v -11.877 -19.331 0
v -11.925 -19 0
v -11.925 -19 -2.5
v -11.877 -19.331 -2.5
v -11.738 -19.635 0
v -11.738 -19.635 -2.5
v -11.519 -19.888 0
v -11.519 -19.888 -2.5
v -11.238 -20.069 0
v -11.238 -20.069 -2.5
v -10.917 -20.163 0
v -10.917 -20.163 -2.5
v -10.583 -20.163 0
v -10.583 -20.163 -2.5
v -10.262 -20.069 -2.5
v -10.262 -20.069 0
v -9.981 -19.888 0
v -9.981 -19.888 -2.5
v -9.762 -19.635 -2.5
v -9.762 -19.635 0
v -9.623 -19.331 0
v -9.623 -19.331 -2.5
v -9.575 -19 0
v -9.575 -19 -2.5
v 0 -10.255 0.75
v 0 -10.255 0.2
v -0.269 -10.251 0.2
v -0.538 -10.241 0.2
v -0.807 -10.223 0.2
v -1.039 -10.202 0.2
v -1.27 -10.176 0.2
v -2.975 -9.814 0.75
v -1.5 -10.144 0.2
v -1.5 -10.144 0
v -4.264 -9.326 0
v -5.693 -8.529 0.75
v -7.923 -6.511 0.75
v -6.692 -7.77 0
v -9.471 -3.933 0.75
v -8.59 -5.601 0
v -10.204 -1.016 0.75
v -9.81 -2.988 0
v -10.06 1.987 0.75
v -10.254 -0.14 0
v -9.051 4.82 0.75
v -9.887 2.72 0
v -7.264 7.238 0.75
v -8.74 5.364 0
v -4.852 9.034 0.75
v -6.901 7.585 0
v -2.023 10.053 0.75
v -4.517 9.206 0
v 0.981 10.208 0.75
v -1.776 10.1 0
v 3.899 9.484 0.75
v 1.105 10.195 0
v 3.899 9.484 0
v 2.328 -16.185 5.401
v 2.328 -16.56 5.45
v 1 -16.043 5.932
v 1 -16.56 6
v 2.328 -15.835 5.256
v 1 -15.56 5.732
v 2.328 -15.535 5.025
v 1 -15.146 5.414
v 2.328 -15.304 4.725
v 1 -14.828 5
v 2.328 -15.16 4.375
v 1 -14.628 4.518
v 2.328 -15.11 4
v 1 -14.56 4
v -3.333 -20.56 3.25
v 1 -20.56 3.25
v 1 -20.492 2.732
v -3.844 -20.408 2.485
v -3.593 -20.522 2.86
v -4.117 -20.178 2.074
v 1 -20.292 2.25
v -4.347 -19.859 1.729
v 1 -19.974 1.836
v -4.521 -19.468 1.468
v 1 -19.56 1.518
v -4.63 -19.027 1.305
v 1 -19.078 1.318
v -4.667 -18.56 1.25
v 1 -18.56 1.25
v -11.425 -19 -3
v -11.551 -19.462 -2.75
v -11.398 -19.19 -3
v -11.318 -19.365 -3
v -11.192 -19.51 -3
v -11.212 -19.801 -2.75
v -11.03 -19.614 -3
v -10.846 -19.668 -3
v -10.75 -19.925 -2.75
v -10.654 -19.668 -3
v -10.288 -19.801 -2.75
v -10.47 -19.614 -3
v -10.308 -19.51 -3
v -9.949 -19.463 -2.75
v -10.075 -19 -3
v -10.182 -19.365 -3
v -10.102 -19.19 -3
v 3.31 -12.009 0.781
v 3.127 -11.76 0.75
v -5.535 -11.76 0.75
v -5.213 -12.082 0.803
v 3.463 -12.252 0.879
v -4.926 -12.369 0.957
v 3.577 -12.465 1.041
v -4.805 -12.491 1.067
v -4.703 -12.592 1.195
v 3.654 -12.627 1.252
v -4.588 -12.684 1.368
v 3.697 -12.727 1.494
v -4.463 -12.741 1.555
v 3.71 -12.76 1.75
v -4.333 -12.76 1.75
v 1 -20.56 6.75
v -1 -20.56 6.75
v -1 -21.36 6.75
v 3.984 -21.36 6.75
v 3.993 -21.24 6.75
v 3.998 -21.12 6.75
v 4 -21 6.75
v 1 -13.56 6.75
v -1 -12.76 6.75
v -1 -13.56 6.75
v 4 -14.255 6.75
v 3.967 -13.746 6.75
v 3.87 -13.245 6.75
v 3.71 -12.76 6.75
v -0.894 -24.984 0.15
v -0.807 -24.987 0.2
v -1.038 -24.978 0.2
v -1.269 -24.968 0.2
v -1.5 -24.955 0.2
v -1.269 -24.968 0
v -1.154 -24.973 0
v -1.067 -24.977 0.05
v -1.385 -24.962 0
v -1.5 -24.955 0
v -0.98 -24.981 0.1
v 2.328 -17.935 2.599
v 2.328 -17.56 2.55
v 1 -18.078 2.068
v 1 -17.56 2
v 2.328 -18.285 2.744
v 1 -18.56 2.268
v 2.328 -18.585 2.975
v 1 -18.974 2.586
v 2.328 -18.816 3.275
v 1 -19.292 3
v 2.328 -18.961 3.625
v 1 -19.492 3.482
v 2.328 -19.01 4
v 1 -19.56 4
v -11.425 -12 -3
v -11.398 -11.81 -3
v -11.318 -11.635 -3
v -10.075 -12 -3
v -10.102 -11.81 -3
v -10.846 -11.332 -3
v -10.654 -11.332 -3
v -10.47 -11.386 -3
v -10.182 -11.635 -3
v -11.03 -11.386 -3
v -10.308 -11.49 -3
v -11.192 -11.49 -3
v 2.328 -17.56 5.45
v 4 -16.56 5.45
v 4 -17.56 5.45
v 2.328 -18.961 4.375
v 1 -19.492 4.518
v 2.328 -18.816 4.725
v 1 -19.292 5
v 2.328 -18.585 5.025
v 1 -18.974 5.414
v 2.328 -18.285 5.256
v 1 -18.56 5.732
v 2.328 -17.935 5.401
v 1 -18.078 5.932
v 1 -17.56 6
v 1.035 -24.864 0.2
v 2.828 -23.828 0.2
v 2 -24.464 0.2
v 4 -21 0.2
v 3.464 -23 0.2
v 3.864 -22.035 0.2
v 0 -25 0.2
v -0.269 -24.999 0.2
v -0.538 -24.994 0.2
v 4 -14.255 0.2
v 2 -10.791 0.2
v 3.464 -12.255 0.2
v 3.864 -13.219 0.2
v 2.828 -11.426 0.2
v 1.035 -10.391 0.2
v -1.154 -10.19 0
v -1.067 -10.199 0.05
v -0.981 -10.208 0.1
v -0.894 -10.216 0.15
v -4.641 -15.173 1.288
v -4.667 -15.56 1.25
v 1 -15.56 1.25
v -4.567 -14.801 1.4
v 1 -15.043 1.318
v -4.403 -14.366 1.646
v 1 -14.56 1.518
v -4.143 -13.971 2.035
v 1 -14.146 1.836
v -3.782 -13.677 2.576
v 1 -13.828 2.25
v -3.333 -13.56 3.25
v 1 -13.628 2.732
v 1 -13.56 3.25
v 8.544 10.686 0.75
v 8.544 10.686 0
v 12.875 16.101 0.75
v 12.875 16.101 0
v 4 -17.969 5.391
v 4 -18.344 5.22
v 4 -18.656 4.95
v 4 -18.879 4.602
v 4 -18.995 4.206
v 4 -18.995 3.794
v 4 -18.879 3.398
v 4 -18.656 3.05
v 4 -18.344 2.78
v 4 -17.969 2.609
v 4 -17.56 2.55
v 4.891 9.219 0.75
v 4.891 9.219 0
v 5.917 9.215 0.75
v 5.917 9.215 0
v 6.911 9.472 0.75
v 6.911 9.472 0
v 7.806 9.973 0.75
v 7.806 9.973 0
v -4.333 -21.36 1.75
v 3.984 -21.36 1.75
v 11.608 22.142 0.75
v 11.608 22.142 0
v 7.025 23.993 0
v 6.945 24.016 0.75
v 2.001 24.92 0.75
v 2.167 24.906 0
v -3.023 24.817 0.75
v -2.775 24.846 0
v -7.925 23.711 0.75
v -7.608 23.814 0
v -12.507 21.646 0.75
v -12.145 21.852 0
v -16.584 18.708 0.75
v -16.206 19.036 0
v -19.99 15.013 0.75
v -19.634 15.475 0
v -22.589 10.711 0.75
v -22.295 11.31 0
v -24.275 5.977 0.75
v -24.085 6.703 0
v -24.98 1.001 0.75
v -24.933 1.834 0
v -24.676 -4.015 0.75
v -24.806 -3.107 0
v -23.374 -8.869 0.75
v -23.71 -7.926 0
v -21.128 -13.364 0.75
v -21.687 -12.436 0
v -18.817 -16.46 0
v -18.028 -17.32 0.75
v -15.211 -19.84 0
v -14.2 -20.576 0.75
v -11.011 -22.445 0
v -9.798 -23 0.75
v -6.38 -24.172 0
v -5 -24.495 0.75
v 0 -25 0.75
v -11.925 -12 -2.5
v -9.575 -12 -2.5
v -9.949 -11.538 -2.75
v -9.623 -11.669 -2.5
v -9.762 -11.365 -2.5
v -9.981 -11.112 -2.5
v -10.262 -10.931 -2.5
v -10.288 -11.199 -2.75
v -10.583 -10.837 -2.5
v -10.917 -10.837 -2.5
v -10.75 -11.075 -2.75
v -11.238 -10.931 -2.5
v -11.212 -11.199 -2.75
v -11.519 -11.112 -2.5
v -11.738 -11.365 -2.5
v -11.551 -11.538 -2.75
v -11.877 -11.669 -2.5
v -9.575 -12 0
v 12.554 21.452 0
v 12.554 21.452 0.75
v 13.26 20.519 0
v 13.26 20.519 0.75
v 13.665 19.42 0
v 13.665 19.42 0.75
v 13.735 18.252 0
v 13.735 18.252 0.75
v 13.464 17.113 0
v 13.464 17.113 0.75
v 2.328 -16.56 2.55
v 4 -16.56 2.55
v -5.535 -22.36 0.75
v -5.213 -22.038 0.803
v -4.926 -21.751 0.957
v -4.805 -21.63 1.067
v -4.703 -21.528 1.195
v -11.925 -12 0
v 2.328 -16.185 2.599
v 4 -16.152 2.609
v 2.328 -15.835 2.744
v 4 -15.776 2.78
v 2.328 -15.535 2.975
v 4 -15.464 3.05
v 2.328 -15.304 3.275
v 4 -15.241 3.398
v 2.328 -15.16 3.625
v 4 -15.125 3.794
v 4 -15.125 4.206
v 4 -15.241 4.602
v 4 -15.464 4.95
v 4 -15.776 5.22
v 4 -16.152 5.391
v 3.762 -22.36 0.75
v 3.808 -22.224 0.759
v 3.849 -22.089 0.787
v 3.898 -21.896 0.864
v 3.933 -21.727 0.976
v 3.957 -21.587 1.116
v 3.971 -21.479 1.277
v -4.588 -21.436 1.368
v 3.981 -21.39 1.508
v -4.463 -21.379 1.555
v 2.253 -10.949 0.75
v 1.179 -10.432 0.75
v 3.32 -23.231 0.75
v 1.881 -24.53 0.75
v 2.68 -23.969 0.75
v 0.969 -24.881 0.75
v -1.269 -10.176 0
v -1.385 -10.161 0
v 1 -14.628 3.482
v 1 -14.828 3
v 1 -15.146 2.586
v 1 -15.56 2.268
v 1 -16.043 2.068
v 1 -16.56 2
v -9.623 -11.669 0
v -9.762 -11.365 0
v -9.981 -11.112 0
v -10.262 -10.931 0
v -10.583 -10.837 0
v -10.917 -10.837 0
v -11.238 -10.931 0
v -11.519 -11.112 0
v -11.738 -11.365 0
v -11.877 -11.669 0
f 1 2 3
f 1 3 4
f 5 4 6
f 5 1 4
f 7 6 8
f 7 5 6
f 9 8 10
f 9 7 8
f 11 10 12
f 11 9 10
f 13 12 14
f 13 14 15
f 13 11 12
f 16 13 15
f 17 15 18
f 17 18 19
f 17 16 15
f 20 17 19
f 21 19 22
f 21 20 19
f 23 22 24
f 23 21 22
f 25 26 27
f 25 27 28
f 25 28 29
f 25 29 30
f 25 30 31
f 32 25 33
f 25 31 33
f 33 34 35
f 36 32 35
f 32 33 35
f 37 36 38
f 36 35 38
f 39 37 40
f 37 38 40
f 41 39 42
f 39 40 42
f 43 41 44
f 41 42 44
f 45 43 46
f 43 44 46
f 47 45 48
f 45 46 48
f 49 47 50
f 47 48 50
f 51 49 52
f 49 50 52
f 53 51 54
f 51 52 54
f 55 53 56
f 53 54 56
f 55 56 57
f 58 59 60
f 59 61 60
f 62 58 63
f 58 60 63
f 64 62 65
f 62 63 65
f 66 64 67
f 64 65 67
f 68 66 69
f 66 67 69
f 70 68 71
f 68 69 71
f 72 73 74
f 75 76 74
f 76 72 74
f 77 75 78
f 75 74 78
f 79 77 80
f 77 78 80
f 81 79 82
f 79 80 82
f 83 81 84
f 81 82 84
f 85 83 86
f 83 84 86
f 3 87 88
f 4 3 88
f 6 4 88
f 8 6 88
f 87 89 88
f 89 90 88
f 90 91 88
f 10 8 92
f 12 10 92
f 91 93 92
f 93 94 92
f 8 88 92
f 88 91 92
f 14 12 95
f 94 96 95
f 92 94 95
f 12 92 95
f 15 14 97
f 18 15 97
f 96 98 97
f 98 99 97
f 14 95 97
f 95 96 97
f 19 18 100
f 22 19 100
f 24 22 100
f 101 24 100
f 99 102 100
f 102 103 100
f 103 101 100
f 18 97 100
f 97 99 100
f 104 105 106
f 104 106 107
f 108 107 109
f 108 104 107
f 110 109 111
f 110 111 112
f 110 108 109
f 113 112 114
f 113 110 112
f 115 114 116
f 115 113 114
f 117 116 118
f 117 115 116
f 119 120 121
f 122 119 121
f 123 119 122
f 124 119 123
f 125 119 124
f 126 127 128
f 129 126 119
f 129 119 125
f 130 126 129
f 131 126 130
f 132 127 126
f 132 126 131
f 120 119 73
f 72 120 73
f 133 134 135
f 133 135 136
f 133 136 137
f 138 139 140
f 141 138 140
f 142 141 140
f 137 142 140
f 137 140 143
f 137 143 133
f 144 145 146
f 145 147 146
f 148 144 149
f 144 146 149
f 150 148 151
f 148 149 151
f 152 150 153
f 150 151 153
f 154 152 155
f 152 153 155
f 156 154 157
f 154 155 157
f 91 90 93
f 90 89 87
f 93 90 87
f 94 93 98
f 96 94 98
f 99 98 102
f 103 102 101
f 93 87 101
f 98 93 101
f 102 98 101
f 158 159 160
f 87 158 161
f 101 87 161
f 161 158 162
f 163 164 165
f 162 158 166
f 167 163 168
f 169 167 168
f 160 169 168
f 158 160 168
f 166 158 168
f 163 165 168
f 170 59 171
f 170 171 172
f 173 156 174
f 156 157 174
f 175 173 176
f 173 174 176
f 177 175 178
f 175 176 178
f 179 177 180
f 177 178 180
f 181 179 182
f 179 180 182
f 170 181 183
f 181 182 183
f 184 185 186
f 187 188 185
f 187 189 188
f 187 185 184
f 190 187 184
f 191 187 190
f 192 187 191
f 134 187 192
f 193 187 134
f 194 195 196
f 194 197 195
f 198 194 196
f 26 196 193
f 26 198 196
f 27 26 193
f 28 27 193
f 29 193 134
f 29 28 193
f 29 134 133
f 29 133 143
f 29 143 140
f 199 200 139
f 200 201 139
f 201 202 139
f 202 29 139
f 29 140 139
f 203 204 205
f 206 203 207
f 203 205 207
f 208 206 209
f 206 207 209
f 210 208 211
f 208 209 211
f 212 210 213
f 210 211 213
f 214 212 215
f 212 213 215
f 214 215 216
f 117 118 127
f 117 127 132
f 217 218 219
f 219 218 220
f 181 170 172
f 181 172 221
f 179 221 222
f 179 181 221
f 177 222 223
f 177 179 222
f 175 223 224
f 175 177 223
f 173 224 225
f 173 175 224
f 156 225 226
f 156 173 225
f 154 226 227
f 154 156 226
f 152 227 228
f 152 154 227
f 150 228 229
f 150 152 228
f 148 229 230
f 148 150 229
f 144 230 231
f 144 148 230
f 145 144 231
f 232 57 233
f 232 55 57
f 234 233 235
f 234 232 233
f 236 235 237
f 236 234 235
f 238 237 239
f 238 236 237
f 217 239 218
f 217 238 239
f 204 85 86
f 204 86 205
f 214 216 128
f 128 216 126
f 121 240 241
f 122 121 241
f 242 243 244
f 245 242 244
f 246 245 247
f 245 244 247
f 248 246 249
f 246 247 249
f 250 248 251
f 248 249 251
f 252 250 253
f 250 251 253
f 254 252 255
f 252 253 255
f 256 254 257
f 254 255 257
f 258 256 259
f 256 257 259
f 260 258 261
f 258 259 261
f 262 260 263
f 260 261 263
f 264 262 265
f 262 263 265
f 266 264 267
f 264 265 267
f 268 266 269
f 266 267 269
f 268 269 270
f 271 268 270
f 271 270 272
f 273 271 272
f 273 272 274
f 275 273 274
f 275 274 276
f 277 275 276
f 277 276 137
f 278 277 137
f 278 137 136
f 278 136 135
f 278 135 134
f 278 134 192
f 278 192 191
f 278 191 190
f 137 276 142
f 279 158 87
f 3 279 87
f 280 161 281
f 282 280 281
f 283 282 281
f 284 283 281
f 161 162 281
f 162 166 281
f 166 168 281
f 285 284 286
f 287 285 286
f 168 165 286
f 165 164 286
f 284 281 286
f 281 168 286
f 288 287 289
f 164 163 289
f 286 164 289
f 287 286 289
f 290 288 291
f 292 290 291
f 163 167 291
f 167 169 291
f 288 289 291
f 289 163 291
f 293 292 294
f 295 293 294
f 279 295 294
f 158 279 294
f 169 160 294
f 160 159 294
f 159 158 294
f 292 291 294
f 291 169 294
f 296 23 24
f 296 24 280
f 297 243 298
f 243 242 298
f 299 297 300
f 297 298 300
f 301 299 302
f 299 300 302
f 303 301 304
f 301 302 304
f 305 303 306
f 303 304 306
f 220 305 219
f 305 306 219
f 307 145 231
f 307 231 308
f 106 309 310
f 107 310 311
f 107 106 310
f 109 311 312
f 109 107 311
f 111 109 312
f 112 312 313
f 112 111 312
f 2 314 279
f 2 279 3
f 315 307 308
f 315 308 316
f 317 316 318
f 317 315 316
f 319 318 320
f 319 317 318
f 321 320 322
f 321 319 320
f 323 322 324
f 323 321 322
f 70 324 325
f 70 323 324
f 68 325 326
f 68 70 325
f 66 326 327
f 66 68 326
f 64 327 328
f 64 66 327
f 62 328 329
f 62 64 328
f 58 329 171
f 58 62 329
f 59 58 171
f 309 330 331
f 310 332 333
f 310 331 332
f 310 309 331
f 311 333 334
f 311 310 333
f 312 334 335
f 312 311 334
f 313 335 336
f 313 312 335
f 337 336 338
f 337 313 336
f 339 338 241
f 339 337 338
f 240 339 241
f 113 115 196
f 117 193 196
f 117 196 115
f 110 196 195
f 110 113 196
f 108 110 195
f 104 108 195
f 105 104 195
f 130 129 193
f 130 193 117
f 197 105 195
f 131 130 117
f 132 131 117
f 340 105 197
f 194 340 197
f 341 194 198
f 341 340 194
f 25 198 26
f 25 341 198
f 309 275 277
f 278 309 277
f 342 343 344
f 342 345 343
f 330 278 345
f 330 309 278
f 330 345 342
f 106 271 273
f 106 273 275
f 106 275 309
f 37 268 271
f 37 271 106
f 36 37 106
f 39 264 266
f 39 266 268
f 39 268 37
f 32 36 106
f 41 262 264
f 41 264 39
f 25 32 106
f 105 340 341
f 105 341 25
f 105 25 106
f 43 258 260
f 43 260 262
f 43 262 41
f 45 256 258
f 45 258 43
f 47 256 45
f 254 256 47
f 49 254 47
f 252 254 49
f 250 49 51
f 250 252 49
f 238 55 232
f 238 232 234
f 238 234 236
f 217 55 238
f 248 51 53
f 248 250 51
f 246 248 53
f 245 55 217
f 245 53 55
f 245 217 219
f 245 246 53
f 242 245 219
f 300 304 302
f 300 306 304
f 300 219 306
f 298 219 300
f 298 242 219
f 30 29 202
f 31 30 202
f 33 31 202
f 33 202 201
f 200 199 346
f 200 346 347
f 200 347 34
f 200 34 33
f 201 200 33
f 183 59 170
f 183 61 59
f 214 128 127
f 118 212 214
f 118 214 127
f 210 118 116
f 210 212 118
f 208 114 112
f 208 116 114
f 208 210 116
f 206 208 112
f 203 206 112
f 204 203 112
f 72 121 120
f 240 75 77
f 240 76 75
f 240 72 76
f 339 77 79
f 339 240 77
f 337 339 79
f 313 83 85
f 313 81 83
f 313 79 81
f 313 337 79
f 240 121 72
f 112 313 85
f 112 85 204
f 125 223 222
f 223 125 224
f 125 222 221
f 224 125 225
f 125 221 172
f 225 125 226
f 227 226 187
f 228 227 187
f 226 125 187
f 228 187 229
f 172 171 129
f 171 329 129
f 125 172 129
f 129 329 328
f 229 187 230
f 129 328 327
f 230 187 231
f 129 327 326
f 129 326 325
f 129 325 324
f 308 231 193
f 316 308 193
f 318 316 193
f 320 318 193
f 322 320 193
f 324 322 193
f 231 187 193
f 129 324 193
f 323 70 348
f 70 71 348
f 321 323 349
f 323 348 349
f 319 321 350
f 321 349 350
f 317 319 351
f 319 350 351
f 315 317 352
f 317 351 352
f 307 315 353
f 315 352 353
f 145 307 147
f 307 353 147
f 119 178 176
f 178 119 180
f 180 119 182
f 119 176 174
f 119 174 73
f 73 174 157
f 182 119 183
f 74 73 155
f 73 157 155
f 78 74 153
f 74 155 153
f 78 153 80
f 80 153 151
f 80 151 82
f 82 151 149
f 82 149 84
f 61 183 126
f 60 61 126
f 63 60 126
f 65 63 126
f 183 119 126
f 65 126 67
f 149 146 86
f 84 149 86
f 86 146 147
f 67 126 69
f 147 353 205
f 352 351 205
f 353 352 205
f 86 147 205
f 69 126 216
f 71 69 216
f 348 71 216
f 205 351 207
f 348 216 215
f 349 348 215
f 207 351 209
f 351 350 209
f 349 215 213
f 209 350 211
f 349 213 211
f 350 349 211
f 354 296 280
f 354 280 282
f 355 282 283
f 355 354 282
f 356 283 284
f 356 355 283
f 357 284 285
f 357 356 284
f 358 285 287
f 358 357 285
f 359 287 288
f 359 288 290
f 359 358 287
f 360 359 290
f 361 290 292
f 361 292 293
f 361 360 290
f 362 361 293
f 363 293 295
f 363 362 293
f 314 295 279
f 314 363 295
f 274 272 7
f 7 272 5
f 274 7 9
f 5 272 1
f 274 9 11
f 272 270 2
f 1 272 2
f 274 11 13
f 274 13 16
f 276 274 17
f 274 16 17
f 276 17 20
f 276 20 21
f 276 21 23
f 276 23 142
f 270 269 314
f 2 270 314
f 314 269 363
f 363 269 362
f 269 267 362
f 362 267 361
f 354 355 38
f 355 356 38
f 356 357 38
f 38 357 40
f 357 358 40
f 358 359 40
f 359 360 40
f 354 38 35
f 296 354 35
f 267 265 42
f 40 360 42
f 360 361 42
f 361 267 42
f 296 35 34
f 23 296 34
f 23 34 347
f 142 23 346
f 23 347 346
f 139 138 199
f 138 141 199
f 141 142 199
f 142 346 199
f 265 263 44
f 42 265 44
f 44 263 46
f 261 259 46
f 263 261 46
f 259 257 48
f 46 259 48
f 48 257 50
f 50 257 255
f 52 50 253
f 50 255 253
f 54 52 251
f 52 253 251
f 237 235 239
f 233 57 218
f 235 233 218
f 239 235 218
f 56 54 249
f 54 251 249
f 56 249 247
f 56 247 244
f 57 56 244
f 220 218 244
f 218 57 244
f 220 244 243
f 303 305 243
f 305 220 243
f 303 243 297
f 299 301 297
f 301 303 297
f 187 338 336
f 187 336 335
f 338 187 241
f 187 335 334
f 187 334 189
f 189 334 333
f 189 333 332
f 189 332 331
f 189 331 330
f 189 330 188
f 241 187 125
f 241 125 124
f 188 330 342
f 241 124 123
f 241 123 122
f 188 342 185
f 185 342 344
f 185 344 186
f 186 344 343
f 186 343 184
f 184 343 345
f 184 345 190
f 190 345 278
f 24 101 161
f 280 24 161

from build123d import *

# Parameters (mm, degrees)
BASE_FLANGE_DEPTH          = 0.75
MOUNT_PEG_DEPTH            = 3
SKETCH4_W                  = 5
SKETCH4_H                  = 8.6
SCREW_BOSS_DEPTH           = 6
SCREW_BOSS_CHAMFER_DEPTH   = 8.6
SCREW_START                = -3
SCREW_BOSS_CLEARANCE_DEPTH = 36.87881814
M2_5_START                 = 1
M2_5_CLEARANCE_SLOT1_DEPTH = 3
PEG_CHAMFER_SIZE           = 0.5
FILLET1_R                  = 1
FILLET2_R                  = 4
SKETCH9_W                  = 5.5
SKETCH9_H                  = 16.180617206
CUT_EXTRUDE1_DEPTH         = 0.2
CHAMFER1_SIZE              = 0.692820323
CHAMFER1_SIZE_2            = 0.4


with BuildPart() as part:
    # Sketch1 → base flange (new body)
    with BuildSketch(Plane.XY):
        with BuildLine():
            Line((4, -24.677925359), (4, -9.442398166))
            ThreePointArc((4, -9.442398166), (-10.158758778, 1.399465338), (6.404113855, 8.009132841))
            Line((6.404113855, 8.009132841), (15.612630109, 19.525516154))
            ThreePointArc((15.612630109, 19.525516154), (-24.179534225, 6.352174798), (4, -24.677925359))
        make_face()
    extrude(amount=BASE_FLANGE_DEPTH)

    # Sketch3 → mount peg (add)
    with BuildSketch(Plane(origin=(0, 0, 0), x_dir=(-1, 0, 0), z_dir=(0, 0, -1))):
        with BuildLine():
            Line((9.575, -19), (9.575, -12))
            ThreePointArc((9.575, -12), (10.75, -10.825), (11.925, -12))
            Line((11.925, -12), (11.925, -19))
            ThreePointArc((11.925, -19), (10.75, -20.175), (9.575, -19))
        make_face()
    extrude(amount=MOUNT_PEG_DEPTH)

    # Sketch4 → screw boss (add)
    with BuildSketch(Plane.XY.offset(0.75)):
        with Locations((1.5, -17.060161762)):
            Rectangle(SKETCH4_W, SKETCH4_H)
    extrude(amount=SCREW_BOSS_DEPTH)

    # Sketch5 → screw boss chamfer (add)
    with BuildSketch(Plane.XZ.offset(21.360161762)):
        Polygon((-1, 0.75), (-1, 6.75), (-5, 0.75), align=None)
    extrude(amount=-SCREW_BOSS_CHAMFER_DEPTH)

    # Sketch6 → screw boss clearance (cut, through all)
    with BuildSketch(Plane(origin=(4, 0, 0), x_dir=(0, 0, -1), z_dir=(1, 0, 0)).offset(SCREW_START)):
        with BuildLine():
            Line((-6.75, -20.560161762), (-3.25, -20.560161762))
            ThreePointArc((-3.25, -20.560161762), (-1.835786438, -19.974375325), (-1.25, -18.560161762))
            Line((-1.25, -18.560161762), (-1.25, -15.560161762))
            ThreePointArc((-1.25, -15.560161762), (-1.835786438, -14.1459482), (-3.25, -13.560161762))
            Line((-3.25, -13.560161762), (-6.75, -13.560161762))
            Line((-6.75, -13.560161762), (-6.75, -20.560161762))
        make_face()
    extrude(amount=-SCREW_BOSS_CLEARANCE_DEPTH, mode=Mode.SUBTRACT)

    # M2.5 Clearance Slot1: read off the stored shape, not the designer's step
    # M2.5 Clearance Slot1 outline → M2.5 Clearance Slot1 (cut)
    with BuildSketch(Plane.YZ.offset(M2_5_START)):
        with BuildLine():
            ThreePointArc((-17.560161762, 5.45), (-19.010161762, 4), (-17.560161762, 2.55))
            Line((-17.560161762, 2.55), (-16.560161762, 2.55))
            ThreePointArc((-16.560161762, 2.55), (-15.110161762, 4), (-16.560161762, 5.45))
            Line((-16.560161762, 5.45), (-17.560161762, 5.45))
        make_face()
    extrude(amount=M2_5_CLEARANCE_SLOT1_DEPTH, mode=Mode.SUBTRACT)

    # M2.5 Clearance Slot1 2: loft between two sections, ruled curve by curve
    m2_5_clearance_slot1_2_from = [
        Edge.make_three_point_arc((2.327817459, -16.560161762, 5.45), (2.327817459, -15.53485693, 5.025304833), (2.327817459, -15.110161762, 4)),
        Edge.make_three_point_arc((2.327817459, -15.110161762, 4), (2.327817459, -15.53485693, 2.974695167), (2.327817459, -16.560161762, 2.55)),
        Edge.make_three_point_arc((2.327817459, -17.560161762, 2.55), (2.327817459, -18.585466595, 2.974695167), (2.327817459, -19.010161762, 4)),
        Edge.make_three_point_arc((2.327817459, -19.010161762, 4), (2.327817459, -18.585466595, 5.025304833), (2.327817459, -17.560161762, 5.45)),
        Edge.make_line((2.327817459, -16.560161762, 2.55), (2.327817459, -17.560161762, 2.55)),
        Edge.make_line((2.327817459, -16.560161762, 5.45), (2.327817459, -17.560161762, 5.45)),
    ]
    m2_5_clearance_slot1_2_to = [
        Edge.make_three_point_arc((1, -16.560161762, 6), (1, -15.1459482, 5.414213562), (1, -14.560161762, 4)),
        Edge.make_three_point_arc((1, -14.560161762, 4), (1, -15.1459482, 2.585786438), (1, -16.560161762, 2)),
        Edge.make_three_point_arc((1, -17.560161762, 2), (1, -18.974375325, 2.585786438), (1, -19.560161762, 4)),
        Edge.make_three_point_arc((1, -19.560161762, 4), (1, -18.974375325, 5.414213562), (1, -17.560161762, 6)),
        Edge.make_line((1, -16.560161762, 2), (1, -17.560161762, 2)),
        Edge.make_line((1, -16.560161762, 6), (1, -17.560161762, 6)),
    ]
    m2_5_clearance_slot1_2 = Solid(Shell([*[Face.make_surface_from_curves(m2_5_clearance_slot1_2_from[k], m2_5_clearance_slot1_2_to[k]) for k in range(6)], Face(Wire(m2_5_clearance_slot1_2_from)), Face(Wire(m2_5_clearance_slot1_2_to))]))
    add(m2_5_clearance_slot1_2, mode=Mode.SUBTRACT)

    # peg chamfer
    peg_chamfer_edges = [part.edges().sort_by_distance(p)[0] for p in [
        (-10.75, -20.175, -3),
        (-11.925, -15.5, -3),
        (-10.75, -10.825, -3),
        (-9.575, -15.5, -3),
    ]]
    chamfer(peg_chamfer_edges, length=PEG_CHAMFER_SIZE)

    # Fillet1
    fillet1_edges = [part.edges().sort_by_distance(p)[0] for p in [
        (-0.5, -12.760161762, 0.75),
        (-0.5, -21.360161762, 0.75),
        (-5, -17.060161762, 0.75),
    ]]
    fillet(fillet1_edges, radius=FILLET1_R)

    # Fillet2
    fillet2_edges = [part.edges().sort_by_distance(p)[0] for p in [
        (4, -9.442398166, 0.375),
        (4, -24.677925359, 0.375),
        (15.612630109, 19.525516154, 0.375),
        (6.404113855, 8.009132841, 0.375),
    ]]
    fillet(fillet2_edges, radius=FILLET2_R)

    # Sketch9 → Cut-Extrude1 (cut)
    with BuildSketch(Plane(origin=(0, 0, 0), x_dir=(-1, 0, 0), z_dir=(0, 0, -1))):
        with Locations((-1.25, -17.718085194)):
            Rectangle(SKETCH9_W, SKETCH9_H)
    extrude(amount=-CUT_EXTRUDE1_DEPTH, mode=Mode.SUBTRACT)

    # Chamfer1
    # the kernel refuses this chamfer: 0.692820323, 0.4 mm, written as the material it adds along each edge
    with BuildSketch(Plane(origin=(-1.5, -26.747345015, 0.2), x_dir=(1, 0, 0), z_dir=(0, 1, 0))) as chamfer1_piece_1_section:
        Polygon((CHAMFER1_SIZE, 0), (0, CHAMFER1_SIZE_2), (0, 0), align=None)
    chamfer1_piece_1 = extrude(amount=18.395329037, mode=Mode.PRIVATE)
    chamfer1_piece_1 = chamfer1_piece_1 & Plane(origin=(0, 0, 0.2), x_dir=(0.6245052043696531, 0.7810206461516994, 0), z_dir=(0, 0, -1)) * Cylinder(25, 40, mode=Mode.PRIVATE)
    chamfer1_piece_1 = chamfer1_piece_1 - Plane(origin=(0, 0, 0.2), x_dir=(0.39006502286727884, -0.9207873141695369, 0), z_dir=(0, 0, -1)) * Cylinder(10.254700538, 40, mode=Mode.PRIVATE)
    chamfer1_piece_1 = split(chamfer1_piece_1, bisect_by=Plane(origin=(-1.5, -26.747345015, 0), z_dir=(0, 0, 1)), keep=Keep.TOP, mode=Mode.PRIVATE)
    add(chamfer1_piece_1)


solid = part.part
